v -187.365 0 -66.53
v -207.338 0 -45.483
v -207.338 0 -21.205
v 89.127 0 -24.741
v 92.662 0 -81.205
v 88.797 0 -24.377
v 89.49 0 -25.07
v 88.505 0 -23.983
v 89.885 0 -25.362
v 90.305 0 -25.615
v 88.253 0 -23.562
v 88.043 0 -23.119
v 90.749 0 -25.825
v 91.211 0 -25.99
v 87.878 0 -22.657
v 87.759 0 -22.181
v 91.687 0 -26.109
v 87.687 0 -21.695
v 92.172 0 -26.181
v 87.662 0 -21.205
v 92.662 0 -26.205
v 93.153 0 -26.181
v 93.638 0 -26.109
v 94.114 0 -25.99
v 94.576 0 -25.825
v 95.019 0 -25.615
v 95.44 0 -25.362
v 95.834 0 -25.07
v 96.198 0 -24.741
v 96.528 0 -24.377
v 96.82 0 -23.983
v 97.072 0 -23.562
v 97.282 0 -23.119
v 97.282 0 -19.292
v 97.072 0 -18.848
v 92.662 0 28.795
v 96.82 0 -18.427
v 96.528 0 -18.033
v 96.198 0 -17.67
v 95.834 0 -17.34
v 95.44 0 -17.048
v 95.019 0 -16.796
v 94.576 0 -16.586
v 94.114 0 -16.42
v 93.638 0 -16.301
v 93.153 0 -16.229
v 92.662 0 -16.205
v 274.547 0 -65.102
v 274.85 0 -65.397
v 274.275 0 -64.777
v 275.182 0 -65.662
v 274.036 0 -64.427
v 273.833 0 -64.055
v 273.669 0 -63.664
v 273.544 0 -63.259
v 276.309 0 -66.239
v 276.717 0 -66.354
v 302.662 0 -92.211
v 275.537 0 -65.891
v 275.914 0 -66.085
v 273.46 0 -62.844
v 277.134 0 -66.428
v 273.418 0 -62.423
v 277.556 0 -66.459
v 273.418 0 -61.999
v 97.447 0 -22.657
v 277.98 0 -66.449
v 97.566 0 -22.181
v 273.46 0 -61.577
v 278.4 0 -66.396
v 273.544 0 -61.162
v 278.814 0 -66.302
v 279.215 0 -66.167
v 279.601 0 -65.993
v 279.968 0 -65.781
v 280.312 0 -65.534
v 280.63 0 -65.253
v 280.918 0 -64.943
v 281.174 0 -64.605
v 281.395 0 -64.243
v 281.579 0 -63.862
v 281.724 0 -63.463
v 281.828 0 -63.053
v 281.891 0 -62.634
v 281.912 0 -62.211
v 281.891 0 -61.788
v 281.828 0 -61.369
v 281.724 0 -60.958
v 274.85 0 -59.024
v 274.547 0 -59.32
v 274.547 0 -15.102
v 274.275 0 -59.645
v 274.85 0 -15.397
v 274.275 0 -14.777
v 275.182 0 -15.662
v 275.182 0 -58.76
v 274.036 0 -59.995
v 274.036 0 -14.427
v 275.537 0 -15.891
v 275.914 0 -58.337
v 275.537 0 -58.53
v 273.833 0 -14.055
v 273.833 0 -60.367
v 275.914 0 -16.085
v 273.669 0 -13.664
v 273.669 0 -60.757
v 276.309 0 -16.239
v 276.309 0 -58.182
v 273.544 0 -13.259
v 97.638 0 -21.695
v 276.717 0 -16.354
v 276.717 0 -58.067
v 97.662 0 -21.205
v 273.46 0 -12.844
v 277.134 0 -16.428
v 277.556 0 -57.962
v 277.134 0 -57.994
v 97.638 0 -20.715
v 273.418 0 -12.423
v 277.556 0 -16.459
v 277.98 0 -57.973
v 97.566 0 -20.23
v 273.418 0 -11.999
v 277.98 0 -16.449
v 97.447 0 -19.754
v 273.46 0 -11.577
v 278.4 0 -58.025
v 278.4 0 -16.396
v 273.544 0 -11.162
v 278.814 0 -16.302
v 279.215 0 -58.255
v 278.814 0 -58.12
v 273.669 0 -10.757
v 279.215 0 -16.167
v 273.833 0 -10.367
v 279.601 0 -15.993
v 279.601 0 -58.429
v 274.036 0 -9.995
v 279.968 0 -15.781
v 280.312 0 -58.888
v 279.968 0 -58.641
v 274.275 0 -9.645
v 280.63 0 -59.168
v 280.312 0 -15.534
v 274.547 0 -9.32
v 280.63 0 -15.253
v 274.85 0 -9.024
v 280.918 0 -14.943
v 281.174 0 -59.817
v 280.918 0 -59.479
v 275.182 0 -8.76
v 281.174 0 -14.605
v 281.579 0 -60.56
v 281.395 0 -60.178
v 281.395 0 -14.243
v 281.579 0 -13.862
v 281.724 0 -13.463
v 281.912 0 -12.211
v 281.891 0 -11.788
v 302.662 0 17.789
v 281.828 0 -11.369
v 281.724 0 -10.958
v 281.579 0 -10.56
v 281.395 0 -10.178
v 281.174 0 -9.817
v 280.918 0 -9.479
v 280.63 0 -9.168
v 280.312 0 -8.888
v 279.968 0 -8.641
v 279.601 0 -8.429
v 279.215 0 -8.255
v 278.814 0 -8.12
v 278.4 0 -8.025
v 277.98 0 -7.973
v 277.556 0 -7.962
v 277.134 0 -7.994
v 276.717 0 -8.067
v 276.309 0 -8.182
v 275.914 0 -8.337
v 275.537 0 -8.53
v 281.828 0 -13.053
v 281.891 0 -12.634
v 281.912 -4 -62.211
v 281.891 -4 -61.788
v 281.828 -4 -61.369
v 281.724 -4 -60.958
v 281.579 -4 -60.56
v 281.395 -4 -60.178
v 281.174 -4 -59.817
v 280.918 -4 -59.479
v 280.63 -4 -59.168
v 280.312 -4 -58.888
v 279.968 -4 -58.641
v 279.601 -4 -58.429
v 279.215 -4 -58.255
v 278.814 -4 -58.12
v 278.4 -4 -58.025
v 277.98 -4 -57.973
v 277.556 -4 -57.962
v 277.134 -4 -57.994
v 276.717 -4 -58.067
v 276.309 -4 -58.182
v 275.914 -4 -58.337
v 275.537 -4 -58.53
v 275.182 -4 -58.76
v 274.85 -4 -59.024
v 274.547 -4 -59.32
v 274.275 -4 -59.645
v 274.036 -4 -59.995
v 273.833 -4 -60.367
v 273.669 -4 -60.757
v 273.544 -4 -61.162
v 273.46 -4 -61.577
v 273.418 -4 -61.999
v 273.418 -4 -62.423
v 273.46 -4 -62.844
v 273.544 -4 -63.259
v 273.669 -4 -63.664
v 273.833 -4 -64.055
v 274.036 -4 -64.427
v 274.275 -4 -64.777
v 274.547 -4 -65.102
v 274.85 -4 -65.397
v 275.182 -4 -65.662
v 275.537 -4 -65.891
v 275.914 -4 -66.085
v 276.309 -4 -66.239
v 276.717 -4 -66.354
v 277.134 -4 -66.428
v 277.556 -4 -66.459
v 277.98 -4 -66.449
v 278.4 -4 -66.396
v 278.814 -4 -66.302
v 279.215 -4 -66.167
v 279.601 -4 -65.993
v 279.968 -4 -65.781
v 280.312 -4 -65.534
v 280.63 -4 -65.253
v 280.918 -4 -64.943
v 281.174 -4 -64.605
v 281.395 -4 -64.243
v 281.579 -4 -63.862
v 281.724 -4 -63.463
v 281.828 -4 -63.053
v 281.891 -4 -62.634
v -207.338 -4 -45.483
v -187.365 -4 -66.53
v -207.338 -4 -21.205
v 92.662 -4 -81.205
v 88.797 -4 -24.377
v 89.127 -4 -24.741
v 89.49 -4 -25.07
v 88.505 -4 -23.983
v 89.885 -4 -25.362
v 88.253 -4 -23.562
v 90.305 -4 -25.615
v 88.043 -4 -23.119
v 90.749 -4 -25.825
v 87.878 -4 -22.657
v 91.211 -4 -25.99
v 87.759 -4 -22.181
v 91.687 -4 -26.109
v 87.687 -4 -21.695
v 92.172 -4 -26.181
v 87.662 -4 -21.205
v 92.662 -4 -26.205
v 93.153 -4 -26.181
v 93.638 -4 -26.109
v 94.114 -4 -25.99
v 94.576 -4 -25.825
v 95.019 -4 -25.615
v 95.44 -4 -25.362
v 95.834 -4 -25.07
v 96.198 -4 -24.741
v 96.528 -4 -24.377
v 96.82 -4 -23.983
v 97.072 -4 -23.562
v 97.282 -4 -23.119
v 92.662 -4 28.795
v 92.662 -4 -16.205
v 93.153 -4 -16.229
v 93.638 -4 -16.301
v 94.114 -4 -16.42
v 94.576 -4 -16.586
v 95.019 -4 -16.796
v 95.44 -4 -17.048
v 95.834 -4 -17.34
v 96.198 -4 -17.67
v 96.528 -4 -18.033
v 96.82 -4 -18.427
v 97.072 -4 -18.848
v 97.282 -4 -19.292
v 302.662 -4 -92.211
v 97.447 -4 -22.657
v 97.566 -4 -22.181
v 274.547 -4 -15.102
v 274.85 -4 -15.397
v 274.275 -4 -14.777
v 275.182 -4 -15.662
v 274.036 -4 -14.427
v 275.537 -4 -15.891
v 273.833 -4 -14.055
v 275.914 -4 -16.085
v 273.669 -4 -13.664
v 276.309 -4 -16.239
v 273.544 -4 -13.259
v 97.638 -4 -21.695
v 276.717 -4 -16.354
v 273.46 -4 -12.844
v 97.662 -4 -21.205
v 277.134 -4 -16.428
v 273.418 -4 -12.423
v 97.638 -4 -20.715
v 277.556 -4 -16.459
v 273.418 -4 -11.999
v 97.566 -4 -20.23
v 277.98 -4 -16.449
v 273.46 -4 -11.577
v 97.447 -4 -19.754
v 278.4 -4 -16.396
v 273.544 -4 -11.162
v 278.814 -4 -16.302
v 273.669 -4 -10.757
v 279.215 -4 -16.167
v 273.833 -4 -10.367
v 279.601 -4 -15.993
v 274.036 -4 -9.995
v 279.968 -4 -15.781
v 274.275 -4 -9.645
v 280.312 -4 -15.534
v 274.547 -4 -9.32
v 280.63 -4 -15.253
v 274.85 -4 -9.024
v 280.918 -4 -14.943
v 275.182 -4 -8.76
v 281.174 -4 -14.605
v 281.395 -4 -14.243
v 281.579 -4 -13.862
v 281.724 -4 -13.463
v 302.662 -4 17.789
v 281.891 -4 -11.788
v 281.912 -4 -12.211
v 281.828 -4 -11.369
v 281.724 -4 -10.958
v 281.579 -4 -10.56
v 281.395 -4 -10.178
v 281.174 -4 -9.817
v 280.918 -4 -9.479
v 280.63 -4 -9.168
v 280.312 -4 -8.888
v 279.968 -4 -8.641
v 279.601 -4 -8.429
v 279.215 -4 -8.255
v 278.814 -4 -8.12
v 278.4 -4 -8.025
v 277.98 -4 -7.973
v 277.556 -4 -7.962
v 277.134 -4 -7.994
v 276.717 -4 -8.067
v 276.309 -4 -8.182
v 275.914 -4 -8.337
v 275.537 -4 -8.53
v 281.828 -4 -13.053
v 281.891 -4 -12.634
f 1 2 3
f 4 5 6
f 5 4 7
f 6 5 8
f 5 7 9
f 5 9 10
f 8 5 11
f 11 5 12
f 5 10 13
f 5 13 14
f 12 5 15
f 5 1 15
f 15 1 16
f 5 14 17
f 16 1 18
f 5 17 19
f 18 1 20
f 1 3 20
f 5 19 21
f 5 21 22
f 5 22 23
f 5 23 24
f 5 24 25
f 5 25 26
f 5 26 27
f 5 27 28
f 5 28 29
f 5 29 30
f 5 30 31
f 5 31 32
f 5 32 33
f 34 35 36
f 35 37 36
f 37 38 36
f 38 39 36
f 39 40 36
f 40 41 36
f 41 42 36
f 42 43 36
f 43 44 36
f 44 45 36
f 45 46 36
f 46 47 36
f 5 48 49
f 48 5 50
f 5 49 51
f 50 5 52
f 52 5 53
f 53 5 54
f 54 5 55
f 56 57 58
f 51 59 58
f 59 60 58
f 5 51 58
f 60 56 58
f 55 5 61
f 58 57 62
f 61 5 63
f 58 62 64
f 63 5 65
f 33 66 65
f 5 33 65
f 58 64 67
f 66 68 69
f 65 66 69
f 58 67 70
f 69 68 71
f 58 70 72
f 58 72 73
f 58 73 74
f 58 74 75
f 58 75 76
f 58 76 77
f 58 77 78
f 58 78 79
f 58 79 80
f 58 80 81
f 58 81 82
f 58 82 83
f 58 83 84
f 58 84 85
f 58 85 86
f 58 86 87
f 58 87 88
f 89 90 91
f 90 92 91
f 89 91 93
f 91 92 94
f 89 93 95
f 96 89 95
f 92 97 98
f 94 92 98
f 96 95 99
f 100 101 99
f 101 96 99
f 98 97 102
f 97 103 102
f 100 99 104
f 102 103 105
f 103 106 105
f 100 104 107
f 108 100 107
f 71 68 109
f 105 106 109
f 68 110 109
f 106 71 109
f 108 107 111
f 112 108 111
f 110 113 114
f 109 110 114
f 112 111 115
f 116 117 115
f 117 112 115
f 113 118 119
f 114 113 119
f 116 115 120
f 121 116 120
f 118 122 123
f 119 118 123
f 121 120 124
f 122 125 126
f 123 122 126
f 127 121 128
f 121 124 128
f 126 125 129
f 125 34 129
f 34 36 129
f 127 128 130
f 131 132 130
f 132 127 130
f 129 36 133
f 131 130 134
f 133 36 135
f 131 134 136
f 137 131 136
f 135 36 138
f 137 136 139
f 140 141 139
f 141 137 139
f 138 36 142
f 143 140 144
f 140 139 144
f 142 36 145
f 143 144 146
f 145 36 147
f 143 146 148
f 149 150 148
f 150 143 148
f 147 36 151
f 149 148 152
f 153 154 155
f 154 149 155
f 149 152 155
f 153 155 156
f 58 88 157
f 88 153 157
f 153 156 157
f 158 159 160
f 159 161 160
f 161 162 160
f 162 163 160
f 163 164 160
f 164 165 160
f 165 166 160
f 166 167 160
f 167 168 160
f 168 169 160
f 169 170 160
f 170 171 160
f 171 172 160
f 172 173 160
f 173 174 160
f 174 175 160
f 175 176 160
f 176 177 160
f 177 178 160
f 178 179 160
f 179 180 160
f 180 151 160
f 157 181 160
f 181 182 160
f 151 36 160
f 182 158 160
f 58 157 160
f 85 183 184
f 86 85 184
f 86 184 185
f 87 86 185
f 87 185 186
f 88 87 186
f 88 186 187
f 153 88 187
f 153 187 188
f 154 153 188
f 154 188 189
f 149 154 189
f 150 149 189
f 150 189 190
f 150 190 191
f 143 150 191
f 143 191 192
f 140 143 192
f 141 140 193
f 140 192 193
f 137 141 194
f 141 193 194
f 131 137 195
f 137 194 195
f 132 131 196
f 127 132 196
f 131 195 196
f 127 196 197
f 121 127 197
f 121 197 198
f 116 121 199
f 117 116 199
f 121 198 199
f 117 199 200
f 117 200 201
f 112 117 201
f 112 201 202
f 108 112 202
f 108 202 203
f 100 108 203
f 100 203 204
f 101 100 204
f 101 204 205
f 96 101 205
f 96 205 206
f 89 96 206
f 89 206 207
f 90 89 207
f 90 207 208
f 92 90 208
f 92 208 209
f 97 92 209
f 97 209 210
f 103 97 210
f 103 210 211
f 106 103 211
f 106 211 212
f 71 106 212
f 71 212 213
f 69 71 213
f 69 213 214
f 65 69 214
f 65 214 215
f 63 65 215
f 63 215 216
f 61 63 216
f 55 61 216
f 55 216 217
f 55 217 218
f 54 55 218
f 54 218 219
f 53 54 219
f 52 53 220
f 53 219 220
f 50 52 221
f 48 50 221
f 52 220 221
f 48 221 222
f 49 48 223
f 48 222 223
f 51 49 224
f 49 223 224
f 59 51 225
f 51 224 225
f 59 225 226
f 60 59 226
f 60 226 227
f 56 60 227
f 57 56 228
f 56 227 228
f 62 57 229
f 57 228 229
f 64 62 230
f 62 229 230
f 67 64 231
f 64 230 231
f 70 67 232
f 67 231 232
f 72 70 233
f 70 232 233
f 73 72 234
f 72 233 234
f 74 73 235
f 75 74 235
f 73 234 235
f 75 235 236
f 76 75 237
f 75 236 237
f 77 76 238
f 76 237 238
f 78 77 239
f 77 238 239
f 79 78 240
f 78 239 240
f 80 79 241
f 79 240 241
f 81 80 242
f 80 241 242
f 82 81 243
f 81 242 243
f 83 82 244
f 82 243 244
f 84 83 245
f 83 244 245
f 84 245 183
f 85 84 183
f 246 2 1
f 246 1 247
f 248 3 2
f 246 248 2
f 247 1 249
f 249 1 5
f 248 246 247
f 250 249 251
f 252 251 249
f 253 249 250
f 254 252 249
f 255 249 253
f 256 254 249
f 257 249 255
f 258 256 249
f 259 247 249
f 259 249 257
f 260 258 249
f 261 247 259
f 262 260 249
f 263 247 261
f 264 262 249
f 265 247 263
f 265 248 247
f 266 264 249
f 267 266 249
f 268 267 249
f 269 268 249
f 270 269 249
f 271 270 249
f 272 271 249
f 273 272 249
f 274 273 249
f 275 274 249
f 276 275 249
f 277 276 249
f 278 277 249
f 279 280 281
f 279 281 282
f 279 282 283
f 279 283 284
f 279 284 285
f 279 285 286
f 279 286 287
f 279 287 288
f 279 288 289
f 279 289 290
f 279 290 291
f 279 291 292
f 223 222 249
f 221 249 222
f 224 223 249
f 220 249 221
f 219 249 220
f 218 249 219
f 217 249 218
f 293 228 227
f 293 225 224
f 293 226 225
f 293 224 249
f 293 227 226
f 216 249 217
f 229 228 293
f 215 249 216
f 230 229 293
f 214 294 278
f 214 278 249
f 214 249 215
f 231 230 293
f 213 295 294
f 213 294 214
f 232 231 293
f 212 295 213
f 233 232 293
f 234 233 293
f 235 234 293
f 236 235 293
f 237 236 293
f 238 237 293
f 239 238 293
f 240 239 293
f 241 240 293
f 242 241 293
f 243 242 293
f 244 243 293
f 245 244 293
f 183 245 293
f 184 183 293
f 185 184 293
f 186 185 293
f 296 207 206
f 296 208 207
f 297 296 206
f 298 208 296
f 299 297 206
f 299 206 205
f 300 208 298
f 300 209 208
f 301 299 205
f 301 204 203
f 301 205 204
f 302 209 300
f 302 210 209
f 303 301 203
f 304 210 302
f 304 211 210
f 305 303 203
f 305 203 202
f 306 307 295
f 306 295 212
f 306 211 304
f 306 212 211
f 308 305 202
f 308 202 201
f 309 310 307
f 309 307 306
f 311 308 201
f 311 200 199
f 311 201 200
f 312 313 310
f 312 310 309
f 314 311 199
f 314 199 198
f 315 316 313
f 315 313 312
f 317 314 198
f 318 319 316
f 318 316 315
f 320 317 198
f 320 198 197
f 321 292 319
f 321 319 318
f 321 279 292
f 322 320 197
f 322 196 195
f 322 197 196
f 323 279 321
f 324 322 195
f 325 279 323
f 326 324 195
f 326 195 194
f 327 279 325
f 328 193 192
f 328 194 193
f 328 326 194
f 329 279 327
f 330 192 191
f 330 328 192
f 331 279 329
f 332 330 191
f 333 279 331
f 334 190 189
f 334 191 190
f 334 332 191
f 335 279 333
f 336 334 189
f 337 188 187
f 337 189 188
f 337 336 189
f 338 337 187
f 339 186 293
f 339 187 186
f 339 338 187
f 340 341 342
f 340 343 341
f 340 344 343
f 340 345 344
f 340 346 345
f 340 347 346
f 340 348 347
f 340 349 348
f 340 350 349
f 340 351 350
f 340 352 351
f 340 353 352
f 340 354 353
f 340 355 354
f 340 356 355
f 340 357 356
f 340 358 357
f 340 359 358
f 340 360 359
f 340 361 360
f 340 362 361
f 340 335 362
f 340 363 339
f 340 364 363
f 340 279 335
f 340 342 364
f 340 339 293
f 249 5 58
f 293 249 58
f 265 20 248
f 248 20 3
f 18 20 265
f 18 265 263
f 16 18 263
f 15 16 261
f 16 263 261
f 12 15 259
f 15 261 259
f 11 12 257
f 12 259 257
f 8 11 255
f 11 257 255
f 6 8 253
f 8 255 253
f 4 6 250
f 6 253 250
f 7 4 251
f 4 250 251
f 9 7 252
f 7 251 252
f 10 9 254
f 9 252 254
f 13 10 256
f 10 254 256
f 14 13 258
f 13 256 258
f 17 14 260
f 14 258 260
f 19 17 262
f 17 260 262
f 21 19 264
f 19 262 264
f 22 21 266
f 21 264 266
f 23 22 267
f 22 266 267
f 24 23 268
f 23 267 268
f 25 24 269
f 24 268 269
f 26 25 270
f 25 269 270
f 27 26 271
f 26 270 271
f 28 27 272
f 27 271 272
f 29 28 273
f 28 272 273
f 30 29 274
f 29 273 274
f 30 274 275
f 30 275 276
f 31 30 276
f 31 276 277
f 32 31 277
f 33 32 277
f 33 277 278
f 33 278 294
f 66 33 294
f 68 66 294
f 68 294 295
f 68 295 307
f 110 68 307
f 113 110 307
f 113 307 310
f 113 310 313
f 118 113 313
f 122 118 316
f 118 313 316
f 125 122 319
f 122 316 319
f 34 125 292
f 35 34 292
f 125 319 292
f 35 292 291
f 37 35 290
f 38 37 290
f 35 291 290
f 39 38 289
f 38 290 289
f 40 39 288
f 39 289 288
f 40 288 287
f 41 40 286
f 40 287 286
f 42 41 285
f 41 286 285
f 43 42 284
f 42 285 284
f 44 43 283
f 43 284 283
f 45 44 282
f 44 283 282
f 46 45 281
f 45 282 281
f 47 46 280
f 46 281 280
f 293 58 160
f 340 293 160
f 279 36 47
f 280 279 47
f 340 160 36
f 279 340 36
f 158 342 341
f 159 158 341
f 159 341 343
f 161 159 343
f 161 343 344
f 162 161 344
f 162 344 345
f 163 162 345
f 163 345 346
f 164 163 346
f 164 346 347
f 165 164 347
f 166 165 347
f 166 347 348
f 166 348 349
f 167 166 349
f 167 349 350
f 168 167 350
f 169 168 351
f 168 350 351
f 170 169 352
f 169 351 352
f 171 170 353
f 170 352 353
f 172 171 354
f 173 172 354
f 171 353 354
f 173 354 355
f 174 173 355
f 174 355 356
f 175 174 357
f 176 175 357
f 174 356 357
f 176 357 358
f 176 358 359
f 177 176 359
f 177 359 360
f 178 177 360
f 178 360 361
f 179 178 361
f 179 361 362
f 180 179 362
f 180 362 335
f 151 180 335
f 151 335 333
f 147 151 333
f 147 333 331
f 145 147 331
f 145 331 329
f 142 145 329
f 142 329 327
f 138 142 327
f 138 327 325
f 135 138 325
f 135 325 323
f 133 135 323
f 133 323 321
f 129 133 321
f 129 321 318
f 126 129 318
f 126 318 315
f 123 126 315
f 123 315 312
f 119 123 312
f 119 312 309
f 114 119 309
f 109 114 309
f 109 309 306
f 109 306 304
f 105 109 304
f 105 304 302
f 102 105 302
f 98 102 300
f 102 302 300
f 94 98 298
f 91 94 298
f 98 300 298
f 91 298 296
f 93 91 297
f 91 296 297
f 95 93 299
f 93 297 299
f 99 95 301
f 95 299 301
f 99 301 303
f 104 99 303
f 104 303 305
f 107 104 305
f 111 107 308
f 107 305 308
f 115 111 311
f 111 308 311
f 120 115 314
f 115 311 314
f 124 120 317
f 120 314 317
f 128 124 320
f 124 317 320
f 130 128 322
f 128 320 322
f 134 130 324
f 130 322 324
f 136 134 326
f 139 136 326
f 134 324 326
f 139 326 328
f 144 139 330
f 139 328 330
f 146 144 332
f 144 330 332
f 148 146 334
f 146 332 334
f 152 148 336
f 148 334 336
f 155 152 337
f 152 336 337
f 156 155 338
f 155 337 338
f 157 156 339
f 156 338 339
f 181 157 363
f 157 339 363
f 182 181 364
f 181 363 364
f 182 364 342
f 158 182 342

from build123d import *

# Parameters (mm, degrees)
F1_DEPTH = 4
F2_SIZE  = 20
F3_R     = 5
F4_DEPTH = 25
F5_R     = 4.25
F6_DEPTH = 25


with BuildPart() as f1:
    # F0 (on Front) → F1 (new body)
    with BuildSketch(Plane.XZ):
        Polygon((92.662452, -21.205135), (-207.337548, -21.205135), (-207.337548, -65.482802), (92.662452, -81.205135), align=None)
        Polygon((92.662452, 28.794865), (92.662452, -21.205135), (92.662452, -81.205135), (302.662452, -92.210769), (302.662452, 17.789231), align=None)
    extrude(amount=F1_DEPTH)

    # F2
    f2_edges = [f1.edges().sort_by_distance(p)[0] for p in [
        (-207.337548, -2, -65.482802),
    ]]
    chamfer(f2_edges, length=F2_SIZE)

    # F3 (on face) → F4 (cut)
    with BuildSketch(Plane.XZ.offset(4)):
        with Locations((92.662452, -21.205135)):
            Circle(F3_R)
    extrude(amount=-F4_DEPTH, mode=Mode.SUBTRACT)

    # F5 (on face) → F6 (cut)
    with BuildSketch(Plane.XZ.offset(4)):
        with Locations((277.662452, -12.210769)):
            Circle(F5_R)
        with Locations((277.662452, -62.210769)):
            Circle(F5_R)
    extrude(amount=-F6_DEPTH, mode=Mode.SUBTRACT)


solid = f1.part
